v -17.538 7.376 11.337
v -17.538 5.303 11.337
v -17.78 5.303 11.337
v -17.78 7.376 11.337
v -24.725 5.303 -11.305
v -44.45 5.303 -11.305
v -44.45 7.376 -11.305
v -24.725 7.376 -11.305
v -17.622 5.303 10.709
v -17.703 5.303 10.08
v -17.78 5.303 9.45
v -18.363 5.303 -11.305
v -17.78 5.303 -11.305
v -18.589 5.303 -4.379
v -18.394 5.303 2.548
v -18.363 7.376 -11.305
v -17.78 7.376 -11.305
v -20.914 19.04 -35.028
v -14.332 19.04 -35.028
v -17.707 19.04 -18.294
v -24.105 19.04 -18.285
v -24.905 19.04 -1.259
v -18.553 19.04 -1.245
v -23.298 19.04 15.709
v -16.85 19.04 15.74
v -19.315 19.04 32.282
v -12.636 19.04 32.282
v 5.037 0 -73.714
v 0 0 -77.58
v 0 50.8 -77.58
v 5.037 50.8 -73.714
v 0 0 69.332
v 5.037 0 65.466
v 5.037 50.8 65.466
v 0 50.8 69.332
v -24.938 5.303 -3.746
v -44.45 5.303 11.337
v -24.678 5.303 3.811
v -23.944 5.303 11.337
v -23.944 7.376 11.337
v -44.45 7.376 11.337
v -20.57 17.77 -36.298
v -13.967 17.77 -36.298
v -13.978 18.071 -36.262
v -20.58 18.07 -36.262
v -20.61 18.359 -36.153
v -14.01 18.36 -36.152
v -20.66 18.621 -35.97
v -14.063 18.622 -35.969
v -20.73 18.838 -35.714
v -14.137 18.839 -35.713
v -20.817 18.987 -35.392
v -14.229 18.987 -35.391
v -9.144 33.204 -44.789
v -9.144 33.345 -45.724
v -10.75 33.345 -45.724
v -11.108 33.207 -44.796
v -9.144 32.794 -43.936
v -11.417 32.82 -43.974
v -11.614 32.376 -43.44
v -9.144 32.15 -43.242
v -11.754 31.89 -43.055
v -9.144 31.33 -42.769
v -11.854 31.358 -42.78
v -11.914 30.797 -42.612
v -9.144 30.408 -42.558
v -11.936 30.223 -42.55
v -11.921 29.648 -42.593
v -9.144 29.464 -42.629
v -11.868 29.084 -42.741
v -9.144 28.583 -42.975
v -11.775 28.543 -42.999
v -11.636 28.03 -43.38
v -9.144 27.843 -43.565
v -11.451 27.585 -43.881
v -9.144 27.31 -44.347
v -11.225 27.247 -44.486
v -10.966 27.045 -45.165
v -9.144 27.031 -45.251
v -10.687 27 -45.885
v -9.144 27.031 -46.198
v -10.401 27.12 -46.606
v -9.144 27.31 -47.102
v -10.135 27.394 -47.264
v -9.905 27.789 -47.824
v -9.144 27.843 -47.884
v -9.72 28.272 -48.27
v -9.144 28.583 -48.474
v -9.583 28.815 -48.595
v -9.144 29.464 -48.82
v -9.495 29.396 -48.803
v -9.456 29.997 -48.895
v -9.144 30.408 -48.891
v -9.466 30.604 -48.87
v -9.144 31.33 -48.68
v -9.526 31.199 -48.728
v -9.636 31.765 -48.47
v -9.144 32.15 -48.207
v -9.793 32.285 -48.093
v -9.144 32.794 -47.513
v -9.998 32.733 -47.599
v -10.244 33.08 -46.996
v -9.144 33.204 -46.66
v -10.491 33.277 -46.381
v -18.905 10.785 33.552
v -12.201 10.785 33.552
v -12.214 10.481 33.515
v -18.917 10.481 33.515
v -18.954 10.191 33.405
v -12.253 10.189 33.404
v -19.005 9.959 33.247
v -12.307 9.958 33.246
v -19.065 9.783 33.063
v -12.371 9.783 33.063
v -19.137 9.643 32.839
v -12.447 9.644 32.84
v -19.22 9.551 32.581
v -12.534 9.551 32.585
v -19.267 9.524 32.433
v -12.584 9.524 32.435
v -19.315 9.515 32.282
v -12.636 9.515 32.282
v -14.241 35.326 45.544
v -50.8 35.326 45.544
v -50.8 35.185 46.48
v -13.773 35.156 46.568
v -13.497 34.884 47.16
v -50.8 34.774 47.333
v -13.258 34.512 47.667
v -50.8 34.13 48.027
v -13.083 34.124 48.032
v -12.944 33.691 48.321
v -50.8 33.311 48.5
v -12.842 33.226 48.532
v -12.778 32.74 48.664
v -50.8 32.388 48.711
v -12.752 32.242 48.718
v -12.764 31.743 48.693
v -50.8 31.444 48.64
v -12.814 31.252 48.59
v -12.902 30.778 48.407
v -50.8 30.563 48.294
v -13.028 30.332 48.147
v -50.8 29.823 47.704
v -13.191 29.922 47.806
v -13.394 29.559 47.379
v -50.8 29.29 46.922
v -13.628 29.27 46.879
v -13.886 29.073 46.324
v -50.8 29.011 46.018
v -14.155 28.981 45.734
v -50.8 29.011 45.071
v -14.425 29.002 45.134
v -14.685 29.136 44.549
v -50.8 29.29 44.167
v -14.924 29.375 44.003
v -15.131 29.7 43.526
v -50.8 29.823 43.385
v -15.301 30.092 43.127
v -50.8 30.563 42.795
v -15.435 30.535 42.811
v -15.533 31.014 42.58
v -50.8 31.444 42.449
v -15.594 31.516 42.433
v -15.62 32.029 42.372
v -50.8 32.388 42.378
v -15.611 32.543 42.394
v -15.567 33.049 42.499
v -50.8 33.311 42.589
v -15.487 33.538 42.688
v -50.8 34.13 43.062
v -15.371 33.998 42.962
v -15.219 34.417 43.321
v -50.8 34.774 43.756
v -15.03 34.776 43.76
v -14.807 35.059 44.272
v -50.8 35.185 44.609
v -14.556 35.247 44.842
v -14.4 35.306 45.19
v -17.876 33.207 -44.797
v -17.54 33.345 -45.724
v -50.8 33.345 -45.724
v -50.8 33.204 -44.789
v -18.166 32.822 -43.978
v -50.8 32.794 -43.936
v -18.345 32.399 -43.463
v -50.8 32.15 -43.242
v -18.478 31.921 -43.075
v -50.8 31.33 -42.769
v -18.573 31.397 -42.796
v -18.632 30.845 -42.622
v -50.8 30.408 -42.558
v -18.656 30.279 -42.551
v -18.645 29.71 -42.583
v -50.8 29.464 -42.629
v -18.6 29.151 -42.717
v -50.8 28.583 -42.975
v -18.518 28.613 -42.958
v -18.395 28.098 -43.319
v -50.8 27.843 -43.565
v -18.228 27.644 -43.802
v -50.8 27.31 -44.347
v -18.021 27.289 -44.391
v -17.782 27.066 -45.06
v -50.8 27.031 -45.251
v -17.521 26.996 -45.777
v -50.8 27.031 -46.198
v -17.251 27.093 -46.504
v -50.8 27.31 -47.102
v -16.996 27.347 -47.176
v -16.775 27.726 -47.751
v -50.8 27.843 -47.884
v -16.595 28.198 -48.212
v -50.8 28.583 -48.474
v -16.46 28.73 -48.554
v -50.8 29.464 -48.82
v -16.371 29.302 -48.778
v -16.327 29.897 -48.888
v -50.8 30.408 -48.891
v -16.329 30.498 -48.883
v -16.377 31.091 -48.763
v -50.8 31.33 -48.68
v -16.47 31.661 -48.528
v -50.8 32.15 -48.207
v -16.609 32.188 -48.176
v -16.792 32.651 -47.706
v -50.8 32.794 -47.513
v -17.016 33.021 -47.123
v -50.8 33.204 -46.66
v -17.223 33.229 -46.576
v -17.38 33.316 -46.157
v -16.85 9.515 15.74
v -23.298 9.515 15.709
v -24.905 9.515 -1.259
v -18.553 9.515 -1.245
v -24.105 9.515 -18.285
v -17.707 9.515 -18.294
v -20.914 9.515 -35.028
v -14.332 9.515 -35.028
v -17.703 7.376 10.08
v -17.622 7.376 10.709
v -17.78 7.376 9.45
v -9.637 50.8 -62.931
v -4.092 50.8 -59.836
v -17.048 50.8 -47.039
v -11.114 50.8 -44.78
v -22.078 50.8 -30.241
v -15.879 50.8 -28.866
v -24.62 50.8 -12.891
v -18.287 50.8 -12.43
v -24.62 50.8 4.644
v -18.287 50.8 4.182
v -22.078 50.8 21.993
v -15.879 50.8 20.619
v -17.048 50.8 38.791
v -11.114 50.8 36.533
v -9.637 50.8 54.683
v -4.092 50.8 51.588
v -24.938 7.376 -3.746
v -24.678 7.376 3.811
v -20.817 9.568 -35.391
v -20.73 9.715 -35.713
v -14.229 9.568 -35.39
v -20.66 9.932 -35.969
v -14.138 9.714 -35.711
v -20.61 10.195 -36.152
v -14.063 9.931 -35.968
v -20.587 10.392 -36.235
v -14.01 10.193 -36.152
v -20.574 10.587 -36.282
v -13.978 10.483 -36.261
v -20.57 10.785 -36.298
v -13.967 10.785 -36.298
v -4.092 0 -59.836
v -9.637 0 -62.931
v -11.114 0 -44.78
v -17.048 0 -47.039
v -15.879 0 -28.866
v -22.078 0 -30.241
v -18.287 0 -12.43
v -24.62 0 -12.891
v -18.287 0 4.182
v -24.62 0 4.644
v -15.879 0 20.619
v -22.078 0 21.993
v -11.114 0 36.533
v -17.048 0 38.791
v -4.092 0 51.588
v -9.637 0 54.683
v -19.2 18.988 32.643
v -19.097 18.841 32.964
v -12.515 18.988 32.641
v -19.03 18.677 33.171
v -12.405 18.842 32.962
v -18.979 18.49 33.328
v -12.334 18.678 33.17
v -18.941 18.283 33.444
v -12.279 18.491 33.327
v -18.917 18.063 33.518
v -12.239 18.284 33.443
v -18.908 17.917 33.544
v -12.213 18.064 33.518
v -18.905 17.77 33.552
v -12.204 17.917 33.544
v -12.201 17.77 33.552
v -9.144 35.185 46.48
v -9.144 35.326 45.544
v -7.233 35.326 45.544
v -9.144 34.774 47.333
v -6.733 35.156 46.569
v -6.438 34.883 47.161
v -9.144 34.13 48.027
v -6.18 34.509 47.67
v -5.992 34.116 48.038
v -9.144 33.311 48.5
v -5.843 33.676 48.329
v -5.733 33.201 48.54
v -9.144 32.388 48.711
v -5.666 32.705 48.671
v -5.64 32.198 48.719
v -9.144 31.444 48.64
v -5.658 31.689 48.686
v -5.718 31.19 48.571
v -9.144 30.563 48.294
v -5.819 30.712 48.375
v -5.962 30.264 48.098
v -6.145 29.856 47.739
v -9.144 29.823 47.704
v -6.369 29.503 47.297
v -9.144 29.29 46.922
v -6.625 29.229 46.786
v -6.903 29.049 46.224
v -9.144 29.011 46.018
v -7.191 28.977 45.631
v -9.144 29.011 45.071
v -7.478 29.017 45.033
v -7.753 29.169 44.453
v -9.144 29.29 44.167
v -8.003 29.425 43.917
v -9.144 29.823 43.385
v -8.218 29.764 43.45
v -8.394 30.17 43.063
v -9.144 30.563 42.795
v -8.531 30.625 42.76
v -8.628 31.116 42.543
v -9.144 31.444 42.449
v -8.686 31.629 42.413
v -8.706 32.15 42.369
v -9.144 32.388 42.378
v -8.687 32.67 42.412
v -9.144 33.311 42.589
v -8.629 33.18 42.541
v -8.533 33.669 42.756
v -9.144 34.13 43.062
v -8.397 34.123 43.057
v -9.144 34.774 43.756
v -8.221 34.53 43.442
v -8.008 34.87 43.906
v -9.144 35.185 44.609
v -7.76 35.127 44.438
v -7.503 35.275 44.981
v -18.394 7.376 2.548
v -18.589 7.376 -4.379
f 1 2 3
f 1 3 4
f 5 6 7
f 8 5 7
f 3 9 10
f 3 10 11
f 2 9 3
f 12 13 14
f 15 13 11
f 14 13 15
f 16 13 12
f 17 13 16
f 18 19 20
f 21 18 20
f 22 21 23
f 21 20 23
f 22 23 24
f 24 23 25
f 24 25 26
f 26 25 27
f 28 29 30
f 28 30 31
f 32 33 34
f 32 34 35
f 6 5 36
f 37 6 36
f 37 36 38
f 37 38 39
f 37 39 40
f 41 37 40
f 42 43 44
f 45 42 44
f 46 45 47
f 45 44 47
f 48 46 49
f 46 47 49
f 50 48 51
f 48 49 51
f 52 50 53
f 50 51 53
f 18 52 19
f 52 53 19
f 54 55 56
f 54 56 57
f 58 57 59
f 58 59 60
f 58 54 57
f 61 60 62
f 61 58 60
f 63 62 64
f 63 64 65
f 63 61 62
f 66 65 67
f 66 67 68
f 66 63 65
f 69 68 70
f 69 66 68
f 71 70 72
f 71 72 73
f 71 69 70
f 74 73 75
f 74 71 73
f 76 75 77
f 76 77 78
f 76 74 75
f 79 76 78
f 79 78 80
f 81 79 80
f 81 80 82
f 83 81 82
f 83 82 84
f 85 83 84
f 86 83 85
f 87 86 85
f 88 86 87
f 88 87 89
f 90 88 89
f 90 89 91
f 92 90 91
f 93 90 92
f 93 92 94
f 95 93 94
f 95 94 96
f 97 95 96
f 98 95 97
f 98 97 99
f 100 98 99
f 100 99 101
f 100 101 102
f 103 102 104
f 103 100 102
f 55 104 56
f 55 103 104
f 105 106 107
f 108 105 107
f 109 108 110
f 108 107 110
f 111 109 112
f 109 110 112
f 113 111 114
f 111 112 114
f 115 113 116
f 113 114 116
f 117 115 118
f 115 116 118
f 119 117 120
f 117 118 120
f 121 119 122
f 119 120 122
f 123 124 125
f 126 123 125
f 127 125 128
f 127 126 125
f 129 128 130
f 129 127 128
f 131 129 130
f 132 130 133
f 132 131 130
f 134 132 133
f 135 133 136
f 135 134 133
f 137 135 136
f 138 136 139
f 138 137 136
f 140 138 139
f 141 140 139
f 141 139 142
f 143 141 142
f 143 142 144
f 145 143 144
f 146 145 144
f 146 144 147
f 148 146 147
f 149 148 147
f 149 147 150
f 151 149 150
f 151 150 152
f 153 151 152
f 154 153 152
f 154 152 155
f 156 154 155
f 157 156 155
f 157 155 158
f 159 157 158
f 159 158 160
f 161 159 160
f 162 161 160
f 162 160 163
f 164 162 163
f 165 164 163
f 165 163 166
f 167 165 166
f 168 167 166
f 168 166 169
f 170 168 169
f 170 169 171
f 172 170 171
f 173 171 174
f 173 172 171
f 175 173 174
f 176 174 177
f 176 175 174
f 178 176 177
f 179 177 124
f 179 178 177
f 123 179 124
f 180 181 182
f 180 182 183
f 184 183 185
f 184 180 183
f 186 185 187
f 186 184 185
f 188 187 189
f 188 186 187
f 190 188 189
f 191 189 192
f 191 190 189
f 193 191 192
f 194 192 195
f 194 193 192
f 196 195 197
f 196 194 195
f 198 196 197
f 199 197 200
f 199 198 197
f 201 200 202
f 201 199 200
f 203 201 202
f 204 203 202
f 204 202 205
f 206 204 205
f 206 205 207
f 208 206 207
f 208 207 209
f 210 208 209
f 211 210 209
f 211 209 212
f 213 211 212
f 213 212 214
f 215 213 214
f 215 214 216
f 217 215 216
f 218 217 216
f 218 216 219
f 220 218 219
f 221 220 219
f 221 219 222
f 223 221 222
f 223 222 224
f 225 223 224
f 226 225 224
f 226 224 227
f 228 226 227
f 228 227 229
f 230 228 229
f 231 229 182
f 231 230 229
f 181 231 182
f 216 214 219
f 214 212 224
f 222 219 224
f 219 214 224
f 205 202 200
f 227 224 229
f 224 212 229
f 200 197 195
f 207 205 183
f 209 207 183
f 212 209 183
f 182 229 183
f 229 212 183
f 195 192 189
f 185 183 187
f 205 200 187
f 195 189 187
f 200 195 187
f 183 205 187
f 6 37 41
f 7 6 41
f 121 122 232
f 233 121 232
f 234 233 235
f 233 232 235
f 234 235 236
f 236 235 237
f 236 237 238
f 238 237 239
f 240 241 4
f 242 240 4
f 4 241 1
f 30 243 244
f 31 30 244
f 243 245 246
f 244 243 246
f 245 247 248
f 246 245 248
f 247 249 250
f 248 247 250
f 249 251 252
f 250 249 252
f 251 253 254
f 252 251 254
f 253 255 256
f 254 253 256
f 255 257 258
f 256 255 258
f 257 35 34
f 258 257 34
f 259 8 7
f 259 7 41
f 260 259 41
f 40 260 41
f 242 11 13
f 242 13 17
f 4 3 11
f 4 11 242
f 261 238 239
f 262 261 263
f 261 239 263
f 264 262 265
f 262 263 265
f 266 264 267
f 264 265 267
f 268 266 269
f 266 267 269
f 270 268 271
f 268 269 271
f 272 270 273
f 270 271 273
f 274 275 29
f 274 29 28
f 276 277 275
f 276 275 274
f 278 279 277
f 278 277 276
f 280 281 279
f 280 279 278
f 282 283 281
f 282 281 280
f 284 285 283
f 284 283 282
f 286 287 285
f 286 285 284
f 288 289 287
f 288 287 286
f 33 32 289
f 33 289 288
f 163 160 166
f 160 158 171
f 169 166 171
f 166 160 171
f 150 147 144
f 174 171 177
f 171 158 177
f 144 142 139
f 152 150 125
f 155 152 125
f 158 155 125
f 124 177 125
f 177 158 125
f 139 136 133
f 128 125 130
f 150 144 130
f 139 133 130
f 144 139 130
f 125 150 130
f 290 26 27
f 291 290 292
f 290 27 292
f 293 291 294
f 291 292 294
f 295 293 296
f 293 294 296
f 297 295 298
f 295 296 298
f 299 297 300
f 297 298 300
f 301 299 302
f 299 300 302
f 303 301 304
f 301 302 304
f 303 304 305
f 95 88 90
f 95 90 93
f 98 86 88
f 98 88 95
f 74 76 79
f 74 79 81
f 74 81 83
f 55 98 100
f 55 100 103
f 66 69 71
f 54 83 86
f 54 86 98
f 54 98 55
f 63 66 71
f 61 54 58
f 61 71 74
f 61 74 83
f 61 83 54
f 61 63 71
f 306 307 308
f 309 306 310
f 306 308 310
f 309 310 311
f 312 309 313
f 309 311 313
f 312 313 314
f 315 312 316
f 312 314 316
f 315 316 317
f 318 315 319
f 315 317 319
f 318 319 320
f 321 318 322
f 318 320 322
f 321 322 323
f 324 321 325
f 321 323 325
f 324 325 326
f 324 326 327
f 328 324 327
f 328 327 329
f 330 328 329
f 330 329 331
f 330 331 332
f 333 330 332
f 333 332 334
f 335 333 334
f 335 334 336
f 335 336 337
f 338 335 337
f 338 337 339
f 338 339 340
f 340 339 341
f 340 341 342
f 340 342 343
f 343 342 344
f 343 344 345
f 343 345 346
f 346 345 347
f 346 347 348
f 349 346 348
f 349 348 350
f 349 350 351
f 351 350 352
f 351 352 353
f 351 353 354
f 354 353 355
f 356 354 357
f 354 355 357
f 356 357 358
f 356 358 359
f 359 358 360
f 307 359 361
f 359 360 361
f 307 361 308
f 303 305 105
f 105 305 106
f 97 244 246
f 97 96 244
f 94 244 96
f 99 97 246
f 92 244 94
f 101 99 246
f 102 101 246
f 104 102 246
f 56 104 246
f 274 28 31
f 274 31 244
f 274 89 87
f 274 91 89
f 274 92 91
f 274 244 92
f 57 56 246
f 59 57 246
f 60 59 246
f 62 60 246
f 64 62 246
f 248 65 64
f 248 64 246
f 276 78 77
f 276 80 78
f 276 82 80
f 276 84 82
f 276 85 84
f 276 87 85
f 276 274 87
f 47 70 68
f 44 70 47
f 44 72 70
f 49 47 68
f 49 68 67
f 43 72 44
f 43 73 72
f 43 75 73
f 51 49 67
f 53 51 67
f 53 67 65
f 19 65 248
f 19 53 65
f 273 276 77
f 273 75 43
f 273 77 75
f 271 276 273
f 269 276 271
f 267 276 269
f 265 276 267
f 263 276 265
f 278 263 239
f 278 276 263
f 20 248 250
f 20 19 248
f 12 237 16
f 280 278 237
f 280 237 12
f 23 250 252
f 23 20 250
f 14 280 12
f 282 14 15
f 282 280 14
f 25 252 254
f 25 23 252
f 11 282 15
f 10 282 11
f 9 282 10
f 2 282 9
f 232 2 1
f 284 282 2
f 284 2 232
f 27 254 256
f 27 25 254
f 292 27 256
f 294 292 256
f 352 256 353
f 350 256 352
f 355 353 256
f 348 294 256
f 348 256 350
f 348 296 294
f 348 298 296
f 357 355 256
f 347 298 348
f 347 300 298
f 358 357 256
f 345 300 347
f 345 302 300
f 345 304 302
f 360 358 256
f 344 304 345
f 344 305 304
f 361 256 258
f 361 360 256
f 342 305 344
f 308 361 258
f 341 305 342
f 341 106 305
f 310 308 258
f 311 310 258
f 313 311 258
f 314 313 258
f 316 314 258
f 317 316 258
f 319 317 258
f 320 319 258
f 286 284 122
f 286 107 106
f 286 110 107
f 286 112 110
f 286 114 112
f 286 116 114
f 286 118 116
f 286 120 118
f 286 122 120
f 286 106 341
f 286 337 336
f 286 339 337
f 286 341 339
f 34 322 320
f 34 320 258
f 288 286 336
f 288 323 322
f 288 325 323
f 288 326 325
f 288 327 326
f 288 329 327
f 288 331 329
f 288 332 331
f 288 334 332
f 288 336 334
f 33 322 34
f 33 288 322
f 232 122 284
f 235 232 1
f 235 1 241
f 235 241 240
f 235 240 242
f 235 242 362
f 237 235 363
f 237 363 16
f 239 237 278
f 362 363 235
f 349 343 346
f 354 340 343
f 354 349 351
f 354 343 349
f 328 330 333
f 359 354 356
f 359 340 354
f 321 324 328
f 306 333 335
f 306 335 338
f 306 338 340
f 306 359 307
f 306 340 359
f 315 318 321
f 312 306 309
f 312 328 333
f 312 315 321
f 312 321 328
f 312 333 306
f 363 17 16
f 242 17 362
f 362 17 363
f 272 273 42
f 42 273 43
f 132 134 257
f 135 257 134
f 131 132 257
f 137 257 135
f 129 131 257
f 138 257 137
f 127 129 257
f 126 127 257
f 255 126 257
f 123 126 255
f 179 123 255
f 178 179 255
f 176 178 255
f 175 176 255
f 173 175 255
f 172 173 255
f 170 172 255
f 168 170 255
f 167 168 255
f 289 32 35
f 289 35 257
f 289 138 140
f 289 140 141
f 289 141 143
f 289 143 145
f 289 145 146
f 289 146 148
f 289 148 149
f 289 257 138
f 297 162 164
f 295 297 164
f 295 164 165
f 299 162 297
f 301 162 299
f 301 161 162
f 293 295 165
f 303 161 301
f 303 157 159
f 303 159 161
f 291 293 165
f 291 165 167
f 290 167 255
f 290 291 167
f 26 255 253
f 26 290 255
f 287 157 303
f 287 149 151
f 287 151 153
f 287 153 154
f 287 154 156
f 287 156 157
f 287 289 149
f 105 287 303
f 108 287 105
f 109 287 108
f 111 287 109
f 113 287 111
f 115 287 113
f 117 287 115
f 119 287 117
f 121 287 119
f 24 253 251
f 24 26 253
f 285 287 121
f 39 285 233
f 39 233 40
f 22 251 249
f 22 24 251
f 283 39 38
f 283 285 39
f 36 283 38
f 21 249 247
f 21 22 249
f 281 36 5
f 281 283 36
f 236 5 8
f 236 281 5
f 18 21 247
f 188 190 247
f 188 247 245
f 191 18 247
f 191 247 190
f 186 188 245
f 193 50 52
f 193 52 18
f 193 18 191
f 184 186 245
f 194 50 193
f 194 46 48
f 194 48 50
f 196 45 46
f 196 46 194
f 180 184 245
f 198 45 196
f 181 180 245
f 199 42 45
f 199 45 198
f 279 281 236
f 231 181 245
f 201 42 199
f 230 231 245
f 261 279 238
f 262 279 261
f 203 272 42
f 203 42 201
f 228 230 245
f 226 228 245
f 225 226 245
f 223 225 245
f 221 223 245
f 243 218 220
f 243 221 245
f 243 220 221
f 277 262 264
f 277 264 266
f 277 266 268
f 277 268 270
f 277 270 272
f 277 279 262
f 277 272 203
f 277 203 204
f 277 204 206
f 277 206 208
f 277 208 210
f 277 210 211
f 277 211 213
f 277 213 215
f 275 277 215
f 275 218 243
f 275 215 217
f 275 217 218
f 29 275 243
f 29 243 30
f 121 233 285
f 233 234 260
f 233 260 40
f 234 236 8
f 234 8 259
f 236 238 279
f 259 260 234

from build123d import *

# Parameters (mm, degrees)
F1_DEPTH  = 50.8
F3_DEPTH  = 50.8
F4_R      = 3.175
F5_DEPTH  = 50.8
F5_FACE_R = 3.175
F6_DEPTH  = 9.144
F7_W      = 2.072896
F7_H      = 22.642412
F8_DEPTH  = 44.45
F8_FACE_W = 2.072896
F8_FACE_H = 22.642412
F9_DEPTH  = 17.78


with BuildPart() as f1:
    # F0 (on Front) → F1 (new body)
    with BuildSketch(Plane.XZ):
        with BuildLine():
            Line((5.037427, 65.466186), (0, 69.3323))
            ThreePointArc((0, 69.3323), (-24.938895, -4.123856), (0, -77.580011))
            Line((0, -77.580011), (5.037427, -73.713898))
            ThreePointArc((5.037427, -73.713898), (-18.588894, -4.123856), (5.037427, 65.466186))
        make_face()
    extrude(amount=-F1_DEPTH)

    # F2 (on Right) → F3 (cut)
    with BuildSketch(Plane.YZ):
        with BuildLine():
            Line((17.769823, 33.552193), (10.784823, 33.552193))
            ThreePointArc((10.784823, 33.552193), (9.886797, 33.180219), (9.514823, 32.282193))
            Line((9.514823, 32.282193), (9.514823, -35.027807))
            ThreePointArc((9.514823, -35.027807), (9.886797, -35.925833), (10.784823, -36.297807))
            Line((10.784823, -36.297807), (17.769823, -36.297807))
            ThreePointArc((17.769823, -36.297807), (18.667848, -35.925833), (19.039823, -35.027807))
            Line((19.039823, -35.027807), (19.039823, 32.282193))
            ThreePointArc((19.039823, 32.282193), (18.667848, 33.180219), (17.769823, 33.552193))
        make_face()
    extrude(amount=-F3_DEPTH, mode=Mode.SUBTRACT)

    # F4 (on Right) → F5 (join)
    with BuildSketch(Plane.YZ):
        with Locations((32.150656, 45.544412)):
            Circle(F4_R)
        with Locations((30.170465, -45.724433)):
            Circle(F4_R)
    extrude(amount=-F5_DEPTH)

    # F5_face (on face) → F6 (cut)
    with BuildSketch(Plane(origin=(0, 32.150656, 45.544412), x_dir=(0, 1, 0), z_dir=(1, 0, 0))):
        Circle(F5_FACE_R)
        with Locations((-1.980191, -91.268845)):
            Circle(F5_FACE_R)
    extrude(amount=-F6_DEPTH, mode=Mode.SUBTRACT)

    # F7 (on Right) → F8 (join)
    with BuildSketch(Plane.YZ):
        with Locations((6.339868, 0.01599)):
            Rectangle(F7_W, F7_H)
    extrude(amount=-F8_DEPTH)

    # F8_face (on face) → F9 (cut)
    with BuildSketch(Plane(origin=(0, 6.339868, 0.01599), x_dir=(0, 1, 0), z_dir=(1, 0, 0))):
        Rectangle(F8_FACE_W, F8_FACE_H)
    extrude(amount=-F9_DEPTH, mode=Mode.SUBTRACT)


solid = f1.part
